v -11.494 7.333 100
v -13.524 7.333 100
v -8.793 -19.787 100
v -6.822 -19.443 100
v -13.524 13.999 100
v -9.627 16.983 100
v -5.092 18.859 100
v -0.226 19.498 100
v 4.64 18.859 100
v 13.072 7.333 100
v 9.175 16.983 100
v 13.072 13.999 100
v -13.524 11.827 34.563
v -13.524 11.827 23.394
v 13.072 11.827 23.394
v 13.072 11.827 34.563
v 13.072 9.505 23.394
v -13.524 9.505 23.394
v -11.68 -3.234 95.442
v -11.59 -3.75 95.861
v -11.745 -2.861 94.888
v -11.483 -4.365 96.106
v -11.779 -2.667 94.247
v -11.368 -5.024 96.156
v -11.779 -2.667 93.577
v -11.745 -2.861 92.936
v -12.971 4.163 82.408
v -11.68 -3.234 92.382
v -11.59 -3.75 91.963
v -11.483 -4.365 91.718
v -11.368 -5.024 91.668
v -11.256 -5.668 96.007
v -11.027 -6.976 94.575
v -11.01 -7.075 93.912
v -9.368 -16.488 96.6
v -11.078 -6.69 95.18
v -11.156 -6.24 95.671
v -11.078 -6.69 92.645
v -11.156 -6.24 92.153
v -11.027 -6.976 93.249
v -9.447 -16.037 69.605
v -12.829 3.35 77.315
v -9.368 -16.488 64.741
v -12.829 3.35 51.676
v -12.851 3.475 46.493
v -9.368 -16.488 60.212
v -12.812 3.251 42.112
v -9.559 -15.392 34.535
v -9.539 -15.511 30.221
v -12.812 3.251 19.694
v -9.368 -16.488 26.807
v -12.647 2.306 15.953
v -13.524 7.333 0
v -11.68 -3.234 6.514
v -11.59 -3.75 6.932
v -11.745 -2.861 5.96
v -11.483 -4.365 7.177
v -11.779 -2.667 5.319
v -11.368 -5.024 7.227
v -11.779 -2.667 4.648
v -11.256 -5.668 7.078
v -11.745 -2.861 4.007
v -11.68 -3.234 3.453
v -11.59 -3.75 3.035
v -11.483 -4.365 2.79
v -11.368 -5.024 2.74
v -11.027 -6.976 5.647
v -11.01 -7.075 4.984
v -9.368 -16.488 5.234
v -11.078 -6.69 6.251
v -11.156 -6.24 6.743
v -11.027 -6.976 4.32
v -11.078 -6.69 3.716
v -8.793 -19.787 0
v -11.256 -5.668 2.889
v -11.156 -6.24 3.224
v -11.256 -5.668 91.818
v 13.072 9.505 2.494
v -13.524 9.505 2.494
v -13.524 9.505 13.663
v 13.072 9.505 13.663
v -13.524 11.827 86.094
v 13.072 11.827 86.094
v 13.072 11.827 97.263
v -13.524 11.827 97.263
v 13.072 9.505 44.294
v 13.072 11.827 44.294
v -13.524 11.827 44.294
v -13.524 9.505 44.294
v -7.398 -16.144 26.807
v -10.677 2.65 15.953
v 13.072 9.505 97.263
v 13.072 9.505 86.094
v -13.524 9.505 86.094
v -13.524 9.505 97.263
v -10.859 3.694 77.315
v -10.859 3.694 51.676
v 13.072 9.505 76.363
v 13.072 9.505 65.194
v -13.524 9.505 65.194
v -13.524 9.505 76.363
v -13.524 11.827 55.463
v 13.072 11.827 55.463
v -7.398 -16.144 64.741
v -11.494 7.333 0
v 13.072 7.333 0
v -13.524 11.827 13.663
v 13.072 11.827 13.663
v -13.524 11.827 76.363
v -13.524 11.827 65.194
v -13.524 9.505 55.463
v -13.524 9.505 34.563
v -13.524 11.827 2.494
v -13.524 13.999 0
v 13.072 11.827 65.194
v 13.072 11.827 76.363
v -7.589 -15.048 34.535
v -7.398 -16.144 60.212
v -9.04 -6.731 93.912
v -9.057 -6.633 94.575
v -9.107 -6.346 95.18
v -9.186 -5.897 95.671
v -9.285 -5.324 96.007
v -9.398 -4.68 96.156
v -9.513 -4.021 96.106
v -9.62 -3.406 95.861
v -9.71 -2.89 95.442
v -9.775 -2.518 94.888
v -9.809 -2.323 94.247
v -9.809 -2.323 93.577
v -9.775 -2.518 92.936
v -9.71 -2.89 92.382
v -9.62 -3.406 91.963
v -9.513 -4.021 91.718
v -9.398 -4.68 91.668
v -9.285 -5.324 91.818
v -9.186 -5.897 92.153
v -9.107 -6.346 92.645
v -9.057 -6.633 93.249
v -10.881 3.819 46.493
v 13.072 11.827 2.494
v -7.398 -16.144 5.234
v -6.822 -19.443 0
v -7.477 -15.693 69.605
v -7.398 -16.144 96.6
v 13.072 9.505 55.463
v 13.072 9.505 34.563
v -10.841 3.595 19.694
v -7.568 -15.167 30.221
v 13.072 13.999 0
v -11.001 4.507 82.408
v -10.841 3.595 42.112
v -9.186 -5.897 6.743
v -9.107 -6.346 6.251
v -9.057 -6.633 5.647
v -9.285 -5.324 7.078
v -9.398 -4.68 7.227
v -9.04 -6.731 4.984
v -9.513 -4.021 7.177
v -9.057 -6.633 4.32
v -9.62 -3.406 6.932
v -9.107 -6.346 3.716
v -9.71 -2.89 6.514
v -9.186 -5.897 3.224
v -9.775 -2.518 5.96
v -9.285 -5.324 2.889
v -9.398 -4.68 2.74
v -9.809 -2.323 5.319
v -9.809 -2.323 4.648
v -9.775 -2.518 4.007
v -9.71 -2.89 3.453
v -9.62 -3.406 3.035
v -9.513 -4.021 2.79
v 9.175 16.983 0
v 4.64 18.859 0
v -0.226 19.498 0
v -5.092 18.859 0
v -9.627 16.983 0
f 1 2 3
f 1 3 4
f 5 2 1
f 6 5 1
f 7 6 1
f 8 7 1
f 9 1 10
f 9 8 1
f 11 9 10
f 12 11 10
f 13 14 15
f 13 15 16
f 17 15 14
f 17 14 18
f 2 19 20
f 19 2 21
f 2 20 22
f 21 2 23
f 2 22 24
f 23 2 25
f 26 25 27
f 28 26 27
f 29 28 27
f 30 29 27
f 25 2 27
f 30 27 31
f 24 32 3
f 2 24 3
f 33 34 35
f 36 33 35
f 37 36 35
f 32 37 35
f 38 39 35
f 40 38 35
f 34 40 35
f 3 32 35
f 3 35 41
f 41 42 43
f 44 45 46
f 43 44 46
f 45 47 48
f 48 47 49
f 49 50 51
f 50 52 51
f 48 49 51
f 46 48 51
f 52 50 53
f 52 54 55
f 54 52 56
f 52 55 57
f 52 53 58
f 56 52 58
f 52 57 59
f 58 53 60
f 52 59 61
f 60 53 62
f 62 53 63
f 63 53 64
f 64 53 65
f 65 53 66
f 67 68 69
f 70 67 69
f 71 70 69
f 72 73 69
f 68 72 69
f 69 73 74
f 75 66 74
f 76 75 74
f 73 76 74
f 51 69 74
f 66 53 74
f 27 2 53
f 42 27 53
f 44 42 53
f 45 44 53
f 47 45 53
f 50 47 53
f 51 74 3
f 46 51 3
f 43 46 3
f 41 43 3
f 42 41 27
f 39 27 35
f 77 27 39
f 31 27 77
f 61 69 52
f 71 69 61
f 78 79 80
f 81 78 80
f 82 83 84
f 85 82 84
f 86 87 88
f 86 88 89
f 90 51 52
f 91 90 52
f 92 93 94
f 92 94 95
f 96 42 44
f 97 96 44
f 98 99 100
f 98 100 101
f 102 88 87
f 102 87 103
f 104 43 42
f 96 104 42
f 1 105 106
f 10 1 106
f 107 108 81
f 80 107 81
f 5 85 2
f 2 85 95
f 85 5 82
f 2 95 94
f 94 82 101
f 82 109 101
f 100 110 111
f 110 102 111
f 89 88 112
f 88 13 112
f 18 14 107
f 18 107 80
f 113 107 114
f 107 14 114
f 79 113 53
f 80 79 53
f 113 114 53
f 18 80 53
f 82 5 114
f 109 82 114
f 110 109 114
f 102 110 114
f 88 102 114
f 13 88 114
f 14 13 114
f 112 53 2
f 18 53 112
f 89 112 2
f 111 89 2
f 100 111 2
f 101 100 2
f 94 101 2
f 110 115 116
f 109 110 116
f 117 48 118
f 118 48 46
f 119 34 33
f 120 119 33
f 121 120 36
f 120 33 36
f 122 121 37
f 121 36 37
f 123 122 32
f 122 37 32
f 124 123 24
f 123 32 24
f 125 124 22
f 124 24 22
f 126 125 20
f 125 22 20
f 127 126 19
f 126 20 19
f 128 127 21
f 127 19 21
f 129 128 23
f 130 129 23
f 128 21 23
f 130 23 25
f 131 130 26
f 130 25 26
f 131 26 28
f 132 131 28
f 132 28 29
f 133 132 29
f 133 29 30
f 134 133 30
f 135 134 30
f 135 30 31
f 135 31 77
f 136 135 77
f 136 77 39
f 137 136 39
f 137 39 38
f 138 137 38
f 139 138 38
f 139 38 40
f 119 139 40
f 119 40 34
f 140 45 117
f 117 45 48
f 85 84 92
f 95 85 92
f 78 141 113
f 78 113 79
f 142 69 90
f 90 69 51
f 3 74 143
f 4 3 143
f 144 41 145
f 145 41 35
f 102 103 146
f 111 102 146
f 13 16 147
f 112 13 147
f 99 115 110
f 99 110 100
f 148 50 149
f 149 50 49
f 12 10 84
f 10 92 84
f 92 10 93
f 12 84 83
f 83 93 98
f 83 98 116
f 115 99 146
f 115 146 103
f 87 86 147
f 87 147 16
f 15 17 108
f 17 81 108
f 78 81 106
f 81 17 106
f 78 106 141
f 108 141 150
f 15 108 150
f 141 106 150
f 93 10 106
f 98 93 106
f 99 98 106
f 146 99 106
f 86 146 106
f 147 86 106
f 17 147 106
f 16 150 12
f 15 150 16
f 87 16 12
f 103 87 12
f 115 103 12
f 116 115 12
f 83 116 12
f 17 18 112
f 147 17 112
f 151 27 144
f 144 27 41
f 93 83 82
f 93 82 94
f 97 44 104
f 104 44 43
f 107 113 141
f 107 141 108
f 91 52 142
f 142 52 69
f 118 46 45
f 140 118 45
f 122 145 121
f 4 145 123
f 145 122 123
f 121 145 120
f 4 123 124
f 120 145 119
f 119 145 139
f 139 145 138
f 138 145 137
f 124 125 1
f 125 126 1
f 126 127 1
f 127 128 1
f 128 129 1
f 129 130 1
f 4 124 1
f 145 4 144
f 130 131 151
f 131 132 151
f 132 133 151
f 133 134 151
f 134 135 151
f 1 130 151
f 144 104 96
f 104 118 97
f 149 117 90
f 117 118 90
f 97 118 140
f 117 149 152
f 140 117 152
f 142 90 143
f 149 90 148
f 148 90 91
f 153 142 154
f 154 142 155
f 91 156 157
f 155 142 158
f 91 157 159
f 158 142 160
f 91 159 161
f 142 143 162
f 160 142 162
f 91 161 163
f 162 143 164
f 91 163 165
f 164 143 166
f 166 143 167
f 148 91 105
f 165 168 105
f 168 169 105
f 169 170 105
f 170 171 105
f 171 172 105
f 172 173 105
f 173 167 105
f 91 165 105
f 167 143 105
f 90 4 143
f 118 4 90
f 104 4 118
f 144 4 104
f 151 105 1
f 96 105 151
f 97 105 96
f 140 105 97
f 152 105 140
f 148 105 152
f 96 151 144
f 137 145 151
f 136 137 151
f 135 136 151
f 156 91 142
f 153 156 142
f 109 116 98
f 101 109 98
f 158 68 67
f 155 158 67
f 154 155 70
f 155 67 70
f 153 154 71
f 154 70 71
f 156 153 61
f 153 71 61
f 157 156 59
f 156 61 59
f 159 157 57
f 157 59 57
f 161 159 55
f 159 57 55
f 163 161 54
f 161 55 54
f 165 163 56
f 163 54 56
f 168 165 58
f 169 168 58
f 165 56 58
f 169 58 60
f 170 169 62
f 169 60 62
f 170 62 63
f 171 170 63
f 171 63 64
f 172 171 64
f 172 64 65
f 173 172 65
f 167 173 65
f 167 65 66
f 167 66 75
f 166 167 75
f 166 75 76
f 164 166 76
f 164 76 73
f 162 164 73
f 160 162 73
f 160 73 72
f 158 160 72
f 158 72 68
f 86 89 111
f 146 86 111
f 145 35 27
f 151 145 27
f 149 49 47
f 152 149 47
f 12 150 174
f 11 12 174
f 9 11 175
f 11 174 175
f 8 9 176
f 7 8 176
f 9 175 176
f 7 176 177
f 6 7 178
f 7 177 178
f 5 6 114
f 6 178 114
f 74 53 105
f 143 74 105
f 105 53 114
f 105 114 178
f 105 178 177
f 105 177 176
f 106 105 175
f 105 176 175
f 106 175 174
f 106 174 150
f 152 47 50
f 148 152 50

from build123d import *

# Parameters (mm, degrees)
F1_DEPTH = 100
F2_W     = 2.322293818
F2_H     = 11.1691281199
F3_DEPTH = 26.5967446956
F4_R     = 2.25
F5_DEPTH = 5


with BuildPart() as f1:
    # F0 (on Top) → F1 (new body)
    with BuildSketch(Plane.XY):
        Polygon((13.0718629807, 13.9992671447), (-13.5238817149, 13.9992671447), (-13.5238817149, 7.3329959996), (-11.4936745146, 7.3329959996), (13.0718629807, 7.3329959996), align=None)
        with BuildLine():
            ThreePointArc((13.0718629807, 13.9992671447), (-0.2260093671, 19.4983686983), (-13.5238817149, 13.9992671447))
            Line((-13.5238817149, 13.9992671447), (13.0718629807, 13.9992671447))
        make_face()
        Polygon((-11.4936745146, 7.3329959996), (-13.5238817149, 7.3329959996), (-8.7926732376, -19.7865962982), (-6.8224309887, -19.4428733275), align=None)
    extrude(amount=F1_DEPTH)

    # F2 (on face) → F3 (cut, through all)
    with BuildSketch(Plane(origin=(-13.5238817149, 0, 0), x_dir=(0, -1, 0), z_dir=(-1, 0, 0))):
        with Locations((-10.6661058962, 91.6783995926)):
            Rectangle(F2_W, F2_H)
        with Locations((-10.6661058962, 70.7783995926)):
            Rectangle(F2_W, F2_H)
        with Locations((-10.6661058962, 49.8783995926)):
            Rectangle(F2_W, F2_H)
        with Locations((-10.6661058962, 28.9783995926)):
            Rectangle(F2_W, F2_H)
        with Locations((-10.6661058962, 8.0783995926)):
            Rectangle(F2_W, F2_H)
    extrude(amount=-F3_DEPTH, mode=Mode.SUBTRACT)

    # F4 (on face) → F5 (cut)
    with BuildSketch(Plane(origin=(-11.8829269994, -2.073062321, 0), x_dir=(0.1718614854, -0.9851211245, 0), z_dir=(-0.9851211245, -0.1718614854, 0))):
        with Locations((2.8274371289, 93.9120426774)):
            Circle(F4_R)
        with Locations((2.8274371289, 4.9835015088)):
            Circle(F4_R)
        Polygon((14.1747677699, 69.6047618985), (14.6328052506, 96.599586308), (-6.3302433118, 82.4077576399), align=None)
        Polygon((-5.5054374928, 51.6755245626), (14.6328052506, 64.7412315011), (-5.5054374928, 77.3152230515), align=None)
        Polygon((13.5203069012, 34.5346203232), (14.6328052506, 60.2121762931), (-5.6320335211, 46.4930304839), align=None)
        Polygon((-5.4043177298, 19.6944773197), (13.6406598613, 30.2205141634), (-5.4043177298, 42.1118887167), align=None)
        Polygon((14.6328052506, 5.2338945679), (14.6328052506, 26.8068239093), (-4.4452575967, 15.9530360252), align=None)
    extrude(amount=-F5_DEPTH, mode=Mode.SUBTRACT)


solid = f1.part
